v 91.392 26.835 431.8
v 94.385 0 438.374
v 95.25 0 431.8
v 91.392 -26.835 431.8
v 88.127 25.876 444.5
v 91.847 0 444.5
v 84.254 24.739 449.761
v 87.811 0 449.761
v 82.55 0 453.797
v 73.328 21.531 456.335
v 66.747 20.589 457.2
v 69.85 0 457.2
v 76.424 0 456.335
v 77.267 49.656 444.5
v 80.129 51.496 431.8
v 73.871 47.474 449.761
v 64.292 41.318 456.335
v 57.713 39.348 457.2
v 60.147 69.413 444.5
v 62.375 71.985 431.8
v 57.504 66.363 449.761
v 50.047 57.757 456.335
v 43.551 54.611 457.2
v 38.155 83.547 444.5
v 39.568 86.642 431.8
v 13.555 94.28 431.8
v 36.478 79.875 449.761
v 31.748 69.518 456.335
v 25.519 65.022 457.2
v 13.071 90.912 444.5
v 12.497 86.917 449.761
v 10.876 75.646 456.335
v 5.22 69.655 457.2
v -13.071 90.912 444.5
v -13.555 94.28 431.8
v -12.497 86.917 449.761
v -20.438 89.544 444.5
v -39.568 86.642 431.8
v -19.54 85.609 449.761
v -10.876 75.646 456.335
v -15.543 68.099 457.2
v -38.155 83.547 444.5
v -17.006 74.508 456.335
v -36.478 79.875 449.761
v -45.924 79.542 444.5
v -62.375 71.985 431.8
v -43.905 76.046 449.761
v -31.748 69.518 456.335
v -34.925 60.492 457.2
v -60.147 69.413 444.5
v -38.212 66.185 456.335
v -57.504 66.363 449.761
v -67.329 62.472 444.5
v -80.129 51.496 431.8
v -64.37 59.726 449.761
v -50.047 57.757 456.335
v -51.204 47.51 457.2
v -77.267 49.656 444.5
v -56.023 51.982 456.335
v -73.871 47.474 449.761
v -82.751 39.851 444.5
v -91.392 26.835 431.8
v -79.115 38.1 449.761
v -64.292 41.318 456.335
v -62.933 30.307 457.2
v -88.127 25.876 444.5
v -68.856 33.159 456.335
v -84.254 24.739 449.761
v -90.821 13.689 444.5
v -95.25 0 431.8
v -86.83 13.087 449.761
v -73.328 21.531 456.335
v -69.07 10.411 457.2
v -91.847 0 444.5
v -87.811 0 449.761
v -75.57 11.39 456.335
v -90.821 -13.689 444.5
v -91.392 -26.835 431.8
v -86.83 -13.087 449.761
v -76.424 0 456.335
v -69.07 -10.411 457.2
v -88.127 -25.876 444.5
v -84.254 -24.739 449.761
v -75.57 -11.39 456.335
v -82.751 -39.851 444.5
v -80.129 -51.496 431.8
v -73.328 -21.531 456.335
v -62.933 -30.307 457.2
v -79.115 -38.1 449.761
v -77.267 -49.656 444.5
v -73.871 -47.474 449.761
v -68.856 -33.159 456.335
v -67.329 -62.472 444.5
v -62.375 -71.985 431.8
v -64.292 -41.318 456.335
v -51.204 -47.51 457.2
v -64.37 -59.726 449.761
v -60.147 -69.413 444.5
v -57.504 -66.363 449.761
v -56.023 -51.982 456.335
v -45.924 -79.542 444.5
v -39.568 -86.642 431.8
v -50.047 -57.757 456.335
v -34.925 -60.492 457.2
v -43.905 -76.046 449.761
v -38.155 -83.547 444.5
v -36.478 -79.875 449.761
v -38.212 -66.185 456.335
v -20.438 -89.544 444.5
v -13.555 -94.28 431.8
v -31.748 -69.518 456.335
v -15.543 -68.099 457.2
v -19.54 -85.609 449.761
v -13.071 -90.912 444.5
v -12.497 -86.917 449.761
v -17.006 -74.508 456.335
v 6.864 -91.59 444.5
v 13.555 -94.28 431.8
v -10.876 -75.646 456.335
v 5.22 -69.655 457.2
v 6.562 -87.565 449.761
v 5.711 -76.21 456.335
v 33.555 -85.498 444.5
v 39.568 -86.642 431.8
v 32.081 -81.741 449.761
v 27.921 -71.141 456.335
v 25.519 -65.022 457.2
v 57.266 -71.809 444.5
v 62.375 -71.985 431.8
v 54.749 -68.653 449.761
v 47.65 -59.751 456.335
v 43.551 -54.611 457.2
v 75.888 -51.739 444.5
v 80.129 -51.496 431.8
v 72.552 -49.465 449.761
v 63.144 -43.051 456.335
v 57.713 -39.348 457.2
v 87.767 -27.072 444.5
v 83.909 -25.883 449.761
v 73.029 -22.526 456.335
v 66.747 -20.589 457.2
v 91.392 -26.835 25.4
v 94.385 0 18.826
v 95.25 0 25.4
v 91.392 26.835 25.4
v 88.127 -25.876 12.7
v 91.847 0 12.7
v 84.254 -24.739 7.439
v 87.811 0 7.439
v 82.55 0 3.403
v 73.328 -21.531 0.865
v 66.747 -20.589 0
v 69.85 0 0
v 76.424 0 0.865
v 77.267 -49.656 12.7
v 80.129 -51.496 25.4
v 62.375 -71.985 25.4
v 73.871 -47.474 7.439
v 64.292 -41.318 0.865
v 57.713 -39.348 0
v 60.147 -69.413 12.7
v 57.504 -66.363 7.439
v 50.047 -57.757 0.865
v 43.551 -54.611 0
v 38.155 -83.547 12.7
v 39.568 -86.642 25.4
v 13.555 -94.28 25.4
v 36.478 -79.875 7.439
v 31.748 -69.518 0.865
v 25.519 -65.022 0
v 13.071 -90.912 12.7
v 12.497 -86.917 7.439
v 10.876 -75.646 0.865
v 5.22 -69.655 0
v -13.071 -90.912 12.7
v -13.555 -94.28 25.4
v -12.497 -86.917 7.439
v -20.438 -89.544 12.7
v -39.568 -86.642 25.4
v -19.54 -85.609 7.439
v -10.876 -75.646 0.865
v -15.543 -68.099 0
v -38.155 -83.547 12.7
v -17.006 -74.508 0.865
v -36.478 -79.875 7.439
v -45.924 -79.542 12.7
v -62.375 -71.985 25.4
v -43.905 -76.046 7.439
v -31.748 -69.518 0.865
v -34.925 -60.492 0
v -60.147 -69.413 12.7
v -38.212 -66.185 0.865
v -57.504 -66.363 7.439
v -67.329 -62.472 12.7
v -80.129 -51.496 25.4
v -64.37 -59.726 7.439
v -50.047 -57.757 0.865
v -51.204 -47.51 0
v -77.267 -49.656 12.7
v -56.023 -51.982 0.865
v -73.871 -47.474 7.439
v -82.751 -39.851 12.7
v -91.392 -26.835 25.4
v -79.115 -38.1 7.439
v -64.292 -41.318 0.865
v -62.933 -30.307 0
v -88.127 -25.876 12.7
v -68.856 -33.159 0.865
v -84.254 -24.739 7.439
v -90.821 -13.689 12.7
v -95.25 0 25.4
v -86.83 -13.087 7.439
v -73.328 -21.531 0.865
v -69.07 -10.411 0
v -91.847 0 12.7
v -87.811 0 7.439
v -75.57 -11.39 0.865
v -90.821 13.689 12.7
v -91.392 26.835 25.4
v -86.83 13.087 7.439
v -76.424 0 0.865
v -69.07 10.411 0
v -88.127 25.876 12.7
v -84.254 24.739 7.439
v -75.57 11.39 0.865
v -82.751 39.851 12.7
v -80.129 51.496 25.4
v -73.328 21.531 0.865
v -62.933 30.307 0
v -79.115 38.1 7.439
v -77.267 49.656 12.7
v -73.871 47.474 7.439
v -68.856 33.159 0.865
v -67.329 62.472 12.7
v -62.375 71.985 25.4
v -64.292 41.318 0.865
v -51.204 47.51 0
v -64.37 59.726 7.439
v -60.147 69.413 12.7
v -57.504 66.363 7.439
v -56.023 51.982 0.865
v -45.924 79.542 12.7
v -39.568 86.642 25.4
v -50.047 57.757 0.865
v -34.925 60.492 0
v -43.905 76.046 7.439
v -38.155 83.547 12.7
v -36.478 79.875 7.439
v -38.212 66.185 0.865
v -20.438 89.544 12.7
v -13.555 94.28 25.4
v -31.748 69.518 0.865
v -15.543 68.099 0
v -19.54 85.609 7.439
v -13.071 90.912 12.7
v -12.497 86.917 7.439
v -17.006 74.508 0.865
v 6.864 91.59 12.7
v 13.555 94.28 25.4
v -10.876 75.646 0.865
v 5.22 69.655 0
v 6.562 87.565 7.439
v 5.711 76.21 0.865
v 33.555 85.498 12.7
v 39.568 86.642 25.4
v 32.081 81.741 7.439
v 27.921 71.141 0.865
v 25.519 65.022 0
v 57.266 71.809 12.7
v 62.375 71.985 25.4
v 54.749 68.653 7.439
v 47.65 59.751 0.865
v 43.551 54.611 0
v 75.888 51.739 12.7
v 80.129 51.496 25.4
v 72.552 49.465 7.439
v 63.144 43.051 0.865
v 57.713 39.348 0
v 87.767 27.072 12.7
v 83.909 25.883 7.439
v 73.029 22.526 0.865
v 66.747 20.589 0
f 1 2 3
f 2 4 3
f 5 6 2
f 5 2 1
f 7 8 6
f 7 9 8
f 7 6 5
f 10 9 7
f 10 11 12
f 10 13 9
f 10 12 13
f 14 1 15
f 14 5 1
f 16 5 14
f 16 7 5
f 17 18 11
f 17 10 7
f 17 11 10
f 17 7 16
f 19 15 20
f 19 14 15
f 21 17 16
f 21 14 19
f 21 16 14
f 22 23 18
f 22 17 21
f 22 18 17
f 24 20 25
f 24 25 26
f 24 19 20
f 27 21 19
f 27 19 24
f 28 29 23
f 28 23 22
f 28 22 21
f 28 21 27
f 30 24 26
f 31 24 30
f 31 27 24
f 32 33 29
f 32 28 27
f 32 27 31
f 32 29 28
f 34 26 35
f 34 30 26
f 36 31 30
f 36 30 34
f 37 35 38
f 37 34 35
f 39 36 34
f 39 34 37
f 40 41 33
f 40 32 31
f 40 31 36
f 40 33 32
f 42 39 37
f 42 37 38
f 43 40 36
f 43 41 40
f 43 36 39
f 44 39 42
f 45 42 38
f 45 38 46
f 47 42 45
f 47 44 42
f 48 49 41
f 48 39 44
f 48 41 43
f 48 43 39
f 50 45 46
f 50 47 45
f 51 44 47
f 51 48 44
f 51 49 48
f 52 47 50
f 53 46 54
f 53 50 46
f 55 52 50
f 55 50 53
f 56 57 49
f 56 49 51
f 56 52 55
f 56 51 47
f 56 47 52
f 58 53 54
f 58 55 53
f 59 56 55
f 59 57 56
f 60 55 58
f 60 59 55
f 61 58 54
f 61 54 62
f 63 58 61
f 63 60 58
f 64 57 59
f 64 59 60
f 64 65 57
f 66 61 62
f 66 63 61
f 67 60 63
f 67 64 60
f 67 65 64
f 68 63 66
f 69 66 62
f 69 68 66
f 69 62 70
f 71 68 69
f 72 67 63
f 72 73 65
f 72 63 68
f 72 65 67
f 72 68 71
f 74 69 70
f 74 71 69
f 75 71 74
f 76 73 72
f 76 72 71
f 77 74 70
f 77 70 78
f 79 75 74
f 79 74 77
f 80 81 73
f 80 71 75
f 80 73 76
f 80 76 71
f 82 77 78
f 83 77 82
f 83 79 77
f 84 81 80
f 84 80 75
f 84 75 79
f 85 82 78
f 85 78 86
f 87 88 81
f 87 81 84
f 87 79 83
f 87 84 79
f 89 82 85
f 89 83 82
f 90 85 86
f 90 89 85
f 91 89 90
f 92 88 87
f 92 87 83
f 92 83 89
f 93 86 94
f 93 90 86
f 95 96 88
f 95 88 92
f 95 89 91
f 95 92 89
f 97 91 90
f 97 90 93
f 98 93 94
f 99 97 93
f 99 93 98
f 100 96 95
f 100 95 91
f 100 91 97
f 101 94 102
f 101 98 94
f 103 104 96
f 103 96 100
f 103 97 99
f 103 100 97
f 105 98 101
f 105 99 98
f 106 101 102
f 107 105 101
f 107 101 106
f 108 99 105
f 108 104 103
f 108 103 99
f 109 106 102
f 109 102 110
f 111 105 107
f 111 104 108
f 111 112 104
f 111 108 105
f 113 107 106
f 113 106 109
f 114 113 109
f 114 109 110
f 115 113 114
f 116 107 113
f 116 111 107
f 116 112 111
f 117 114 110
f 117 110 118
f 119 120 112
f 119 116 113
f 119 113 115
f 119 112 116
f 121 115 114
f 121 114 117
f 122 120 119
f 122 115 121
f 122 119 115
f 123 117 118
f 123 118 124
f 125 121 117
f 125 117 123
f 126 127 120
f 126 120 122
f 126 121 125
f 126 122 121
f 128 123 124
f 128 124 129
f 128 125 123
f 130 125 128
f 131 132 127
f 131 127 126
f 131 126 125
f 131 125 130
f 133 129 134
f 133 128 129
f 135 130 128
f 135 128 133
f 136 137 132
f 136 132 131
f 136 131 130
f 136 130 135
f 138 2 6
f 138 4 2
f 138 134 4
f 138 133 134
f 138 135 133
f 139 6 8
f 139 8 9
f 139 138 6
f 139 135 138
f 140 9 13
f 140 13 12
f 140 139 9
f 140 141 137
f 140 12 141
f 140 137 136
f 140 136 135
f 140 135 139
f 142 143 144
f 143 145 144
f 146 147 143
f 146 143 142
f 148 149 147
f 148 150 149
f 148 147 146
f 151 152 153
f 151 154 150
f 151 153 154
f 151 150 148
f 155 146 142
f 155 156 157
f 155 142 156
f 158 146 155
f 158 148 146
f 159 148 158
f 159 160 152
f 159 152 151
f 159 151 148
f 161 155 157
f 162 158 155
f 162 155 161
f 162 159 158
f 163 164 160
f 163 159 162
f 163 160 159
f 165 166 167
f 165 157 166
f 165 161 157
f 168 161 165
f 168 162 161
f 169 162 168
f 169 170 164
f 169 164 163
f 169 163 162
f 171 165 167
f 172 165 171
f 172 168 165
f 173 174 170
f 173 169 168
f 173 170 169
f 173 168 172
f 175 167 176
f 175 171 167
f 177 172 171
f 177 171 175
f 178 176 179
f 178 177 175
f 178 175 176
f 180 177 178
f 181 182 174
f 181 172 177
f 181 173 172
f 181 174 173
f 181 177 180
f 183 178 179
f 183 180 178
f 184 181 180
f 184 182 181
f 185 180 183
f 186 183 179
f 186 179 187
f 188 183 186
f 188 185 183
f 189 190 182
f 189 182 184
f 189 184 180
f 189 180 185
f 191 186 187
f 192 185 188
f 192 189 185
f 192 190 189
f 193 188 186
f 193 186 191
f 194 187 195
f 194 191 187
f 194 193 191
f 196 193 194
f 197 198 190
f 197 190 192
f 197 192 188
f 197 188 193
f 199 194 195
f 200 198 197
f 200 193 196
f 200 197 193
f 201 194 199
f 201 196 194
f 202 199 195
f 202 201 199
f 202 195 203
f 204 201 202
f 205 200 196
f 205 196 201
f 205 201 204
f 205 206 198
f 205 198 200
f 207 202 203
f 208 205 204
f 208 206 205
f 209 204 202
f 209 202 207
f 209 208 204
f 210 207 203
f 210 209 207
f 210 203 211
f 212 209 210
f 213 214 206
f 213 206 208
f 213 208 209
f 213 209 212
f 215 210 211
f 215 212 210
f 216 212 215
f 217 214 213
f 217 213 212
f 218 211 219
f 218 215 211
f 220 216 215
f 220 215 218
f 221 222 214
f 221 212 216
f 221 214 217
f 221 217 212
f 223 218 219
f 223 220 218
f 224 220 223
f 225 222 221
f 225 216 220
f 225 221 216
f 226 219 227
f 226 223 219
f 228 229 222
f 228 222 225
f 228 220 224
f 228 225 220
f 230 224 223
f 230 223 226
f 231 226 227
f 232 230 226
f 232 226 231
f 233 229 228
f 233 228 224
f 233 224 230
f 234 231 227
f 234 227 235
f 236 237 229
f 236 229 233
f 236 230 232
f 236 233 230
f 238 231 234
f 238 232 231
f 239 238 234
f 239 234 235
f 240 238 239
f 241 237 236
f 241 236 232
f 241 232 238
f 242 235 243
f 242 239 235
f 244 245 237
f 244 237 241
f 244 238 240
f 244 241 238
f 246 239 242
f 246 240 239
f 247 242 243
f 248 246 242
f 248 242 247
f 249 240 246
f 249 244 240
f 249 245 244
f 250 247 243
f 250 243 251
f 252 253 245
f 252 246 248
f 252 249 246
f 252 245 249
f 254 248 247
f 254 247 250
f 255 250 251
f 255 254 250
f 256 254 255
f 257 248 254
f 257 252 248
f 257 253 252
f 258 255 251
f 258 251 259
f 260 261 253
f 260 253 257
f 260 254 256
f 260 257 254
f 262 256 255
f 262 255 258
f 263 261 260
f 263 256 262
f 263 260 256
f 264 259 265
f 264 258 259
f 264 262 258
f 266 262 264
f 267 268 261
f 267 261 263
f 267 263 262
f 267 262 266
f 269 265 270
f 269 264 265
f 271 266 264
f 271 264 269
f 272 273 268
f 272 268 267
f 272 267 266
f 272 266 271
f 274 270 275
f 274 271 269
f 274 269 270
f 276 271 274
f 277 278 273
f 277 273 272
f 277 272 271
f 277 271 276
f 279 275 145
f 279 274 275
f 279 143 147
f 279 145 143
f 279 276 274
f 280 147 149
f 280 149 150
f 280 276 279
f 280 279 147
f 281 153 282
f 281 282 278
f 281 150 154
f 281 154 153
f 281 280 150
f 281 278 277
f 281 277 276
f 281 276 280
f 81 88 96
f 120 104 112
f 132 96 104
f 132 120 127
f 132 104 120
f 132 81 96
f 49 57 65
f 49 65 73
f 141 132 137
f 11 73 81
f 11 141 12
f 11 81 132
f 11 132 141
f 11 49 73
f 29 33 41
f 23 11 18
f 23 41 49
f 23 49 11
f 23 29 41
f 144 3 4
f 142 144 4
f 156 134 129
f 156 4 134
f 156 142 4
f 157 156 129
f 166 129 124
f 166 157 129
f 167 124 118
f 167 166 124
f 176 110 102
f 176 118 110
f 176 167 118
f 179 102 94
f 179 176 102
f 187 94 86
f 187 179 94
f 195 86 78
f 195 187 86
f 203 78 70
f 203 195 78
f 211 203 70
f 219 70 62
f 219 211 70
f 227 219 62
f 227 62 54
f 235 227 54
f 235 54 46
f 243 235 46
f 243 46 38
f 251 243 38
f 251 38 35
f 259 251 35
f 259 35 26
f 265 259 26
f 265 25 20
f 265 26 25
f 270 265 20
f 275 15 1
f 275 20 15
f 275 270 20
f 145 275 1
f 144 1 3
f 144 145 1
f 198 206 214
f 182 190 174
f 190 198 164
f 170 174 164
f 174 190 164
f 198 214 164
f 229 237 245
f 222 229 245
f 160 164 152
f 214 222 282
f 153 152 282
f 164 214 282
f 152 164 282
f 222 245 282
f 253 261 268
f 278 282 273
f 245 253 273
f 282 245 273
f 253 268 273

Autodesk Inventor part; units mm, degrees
ref_plane "YZ Plane" through (0, 0, 0) normal (1, 0, 0) x (0, 1, 0)
ref_plane "XZ Plane" through (0, 0, 0) normal (0, 1, 0) x (-1, 0, 0)
ref_plane "XY Plane" through (0, 0, 0) normal (0, 0, 1) x (1, 0, 0)
sketch "Sketch1" plane through (0, 0, 0) normal (0, 0, 1) x (1, 0, 0)
  circle A0 centre (0, 0) radius 95.25
  dimension "d0" = 190.5
extrude "Extrusion1" add sketch "Sketch1" along normal blind 457.2
fillet "Fillet1" radius 25.4 1 edges at (-95.25, 0, 0)
fillet "Fillet2" radius 25.4 1 edges at (-95.25, 0, 457.2)
properties part number "daGasContiner"
